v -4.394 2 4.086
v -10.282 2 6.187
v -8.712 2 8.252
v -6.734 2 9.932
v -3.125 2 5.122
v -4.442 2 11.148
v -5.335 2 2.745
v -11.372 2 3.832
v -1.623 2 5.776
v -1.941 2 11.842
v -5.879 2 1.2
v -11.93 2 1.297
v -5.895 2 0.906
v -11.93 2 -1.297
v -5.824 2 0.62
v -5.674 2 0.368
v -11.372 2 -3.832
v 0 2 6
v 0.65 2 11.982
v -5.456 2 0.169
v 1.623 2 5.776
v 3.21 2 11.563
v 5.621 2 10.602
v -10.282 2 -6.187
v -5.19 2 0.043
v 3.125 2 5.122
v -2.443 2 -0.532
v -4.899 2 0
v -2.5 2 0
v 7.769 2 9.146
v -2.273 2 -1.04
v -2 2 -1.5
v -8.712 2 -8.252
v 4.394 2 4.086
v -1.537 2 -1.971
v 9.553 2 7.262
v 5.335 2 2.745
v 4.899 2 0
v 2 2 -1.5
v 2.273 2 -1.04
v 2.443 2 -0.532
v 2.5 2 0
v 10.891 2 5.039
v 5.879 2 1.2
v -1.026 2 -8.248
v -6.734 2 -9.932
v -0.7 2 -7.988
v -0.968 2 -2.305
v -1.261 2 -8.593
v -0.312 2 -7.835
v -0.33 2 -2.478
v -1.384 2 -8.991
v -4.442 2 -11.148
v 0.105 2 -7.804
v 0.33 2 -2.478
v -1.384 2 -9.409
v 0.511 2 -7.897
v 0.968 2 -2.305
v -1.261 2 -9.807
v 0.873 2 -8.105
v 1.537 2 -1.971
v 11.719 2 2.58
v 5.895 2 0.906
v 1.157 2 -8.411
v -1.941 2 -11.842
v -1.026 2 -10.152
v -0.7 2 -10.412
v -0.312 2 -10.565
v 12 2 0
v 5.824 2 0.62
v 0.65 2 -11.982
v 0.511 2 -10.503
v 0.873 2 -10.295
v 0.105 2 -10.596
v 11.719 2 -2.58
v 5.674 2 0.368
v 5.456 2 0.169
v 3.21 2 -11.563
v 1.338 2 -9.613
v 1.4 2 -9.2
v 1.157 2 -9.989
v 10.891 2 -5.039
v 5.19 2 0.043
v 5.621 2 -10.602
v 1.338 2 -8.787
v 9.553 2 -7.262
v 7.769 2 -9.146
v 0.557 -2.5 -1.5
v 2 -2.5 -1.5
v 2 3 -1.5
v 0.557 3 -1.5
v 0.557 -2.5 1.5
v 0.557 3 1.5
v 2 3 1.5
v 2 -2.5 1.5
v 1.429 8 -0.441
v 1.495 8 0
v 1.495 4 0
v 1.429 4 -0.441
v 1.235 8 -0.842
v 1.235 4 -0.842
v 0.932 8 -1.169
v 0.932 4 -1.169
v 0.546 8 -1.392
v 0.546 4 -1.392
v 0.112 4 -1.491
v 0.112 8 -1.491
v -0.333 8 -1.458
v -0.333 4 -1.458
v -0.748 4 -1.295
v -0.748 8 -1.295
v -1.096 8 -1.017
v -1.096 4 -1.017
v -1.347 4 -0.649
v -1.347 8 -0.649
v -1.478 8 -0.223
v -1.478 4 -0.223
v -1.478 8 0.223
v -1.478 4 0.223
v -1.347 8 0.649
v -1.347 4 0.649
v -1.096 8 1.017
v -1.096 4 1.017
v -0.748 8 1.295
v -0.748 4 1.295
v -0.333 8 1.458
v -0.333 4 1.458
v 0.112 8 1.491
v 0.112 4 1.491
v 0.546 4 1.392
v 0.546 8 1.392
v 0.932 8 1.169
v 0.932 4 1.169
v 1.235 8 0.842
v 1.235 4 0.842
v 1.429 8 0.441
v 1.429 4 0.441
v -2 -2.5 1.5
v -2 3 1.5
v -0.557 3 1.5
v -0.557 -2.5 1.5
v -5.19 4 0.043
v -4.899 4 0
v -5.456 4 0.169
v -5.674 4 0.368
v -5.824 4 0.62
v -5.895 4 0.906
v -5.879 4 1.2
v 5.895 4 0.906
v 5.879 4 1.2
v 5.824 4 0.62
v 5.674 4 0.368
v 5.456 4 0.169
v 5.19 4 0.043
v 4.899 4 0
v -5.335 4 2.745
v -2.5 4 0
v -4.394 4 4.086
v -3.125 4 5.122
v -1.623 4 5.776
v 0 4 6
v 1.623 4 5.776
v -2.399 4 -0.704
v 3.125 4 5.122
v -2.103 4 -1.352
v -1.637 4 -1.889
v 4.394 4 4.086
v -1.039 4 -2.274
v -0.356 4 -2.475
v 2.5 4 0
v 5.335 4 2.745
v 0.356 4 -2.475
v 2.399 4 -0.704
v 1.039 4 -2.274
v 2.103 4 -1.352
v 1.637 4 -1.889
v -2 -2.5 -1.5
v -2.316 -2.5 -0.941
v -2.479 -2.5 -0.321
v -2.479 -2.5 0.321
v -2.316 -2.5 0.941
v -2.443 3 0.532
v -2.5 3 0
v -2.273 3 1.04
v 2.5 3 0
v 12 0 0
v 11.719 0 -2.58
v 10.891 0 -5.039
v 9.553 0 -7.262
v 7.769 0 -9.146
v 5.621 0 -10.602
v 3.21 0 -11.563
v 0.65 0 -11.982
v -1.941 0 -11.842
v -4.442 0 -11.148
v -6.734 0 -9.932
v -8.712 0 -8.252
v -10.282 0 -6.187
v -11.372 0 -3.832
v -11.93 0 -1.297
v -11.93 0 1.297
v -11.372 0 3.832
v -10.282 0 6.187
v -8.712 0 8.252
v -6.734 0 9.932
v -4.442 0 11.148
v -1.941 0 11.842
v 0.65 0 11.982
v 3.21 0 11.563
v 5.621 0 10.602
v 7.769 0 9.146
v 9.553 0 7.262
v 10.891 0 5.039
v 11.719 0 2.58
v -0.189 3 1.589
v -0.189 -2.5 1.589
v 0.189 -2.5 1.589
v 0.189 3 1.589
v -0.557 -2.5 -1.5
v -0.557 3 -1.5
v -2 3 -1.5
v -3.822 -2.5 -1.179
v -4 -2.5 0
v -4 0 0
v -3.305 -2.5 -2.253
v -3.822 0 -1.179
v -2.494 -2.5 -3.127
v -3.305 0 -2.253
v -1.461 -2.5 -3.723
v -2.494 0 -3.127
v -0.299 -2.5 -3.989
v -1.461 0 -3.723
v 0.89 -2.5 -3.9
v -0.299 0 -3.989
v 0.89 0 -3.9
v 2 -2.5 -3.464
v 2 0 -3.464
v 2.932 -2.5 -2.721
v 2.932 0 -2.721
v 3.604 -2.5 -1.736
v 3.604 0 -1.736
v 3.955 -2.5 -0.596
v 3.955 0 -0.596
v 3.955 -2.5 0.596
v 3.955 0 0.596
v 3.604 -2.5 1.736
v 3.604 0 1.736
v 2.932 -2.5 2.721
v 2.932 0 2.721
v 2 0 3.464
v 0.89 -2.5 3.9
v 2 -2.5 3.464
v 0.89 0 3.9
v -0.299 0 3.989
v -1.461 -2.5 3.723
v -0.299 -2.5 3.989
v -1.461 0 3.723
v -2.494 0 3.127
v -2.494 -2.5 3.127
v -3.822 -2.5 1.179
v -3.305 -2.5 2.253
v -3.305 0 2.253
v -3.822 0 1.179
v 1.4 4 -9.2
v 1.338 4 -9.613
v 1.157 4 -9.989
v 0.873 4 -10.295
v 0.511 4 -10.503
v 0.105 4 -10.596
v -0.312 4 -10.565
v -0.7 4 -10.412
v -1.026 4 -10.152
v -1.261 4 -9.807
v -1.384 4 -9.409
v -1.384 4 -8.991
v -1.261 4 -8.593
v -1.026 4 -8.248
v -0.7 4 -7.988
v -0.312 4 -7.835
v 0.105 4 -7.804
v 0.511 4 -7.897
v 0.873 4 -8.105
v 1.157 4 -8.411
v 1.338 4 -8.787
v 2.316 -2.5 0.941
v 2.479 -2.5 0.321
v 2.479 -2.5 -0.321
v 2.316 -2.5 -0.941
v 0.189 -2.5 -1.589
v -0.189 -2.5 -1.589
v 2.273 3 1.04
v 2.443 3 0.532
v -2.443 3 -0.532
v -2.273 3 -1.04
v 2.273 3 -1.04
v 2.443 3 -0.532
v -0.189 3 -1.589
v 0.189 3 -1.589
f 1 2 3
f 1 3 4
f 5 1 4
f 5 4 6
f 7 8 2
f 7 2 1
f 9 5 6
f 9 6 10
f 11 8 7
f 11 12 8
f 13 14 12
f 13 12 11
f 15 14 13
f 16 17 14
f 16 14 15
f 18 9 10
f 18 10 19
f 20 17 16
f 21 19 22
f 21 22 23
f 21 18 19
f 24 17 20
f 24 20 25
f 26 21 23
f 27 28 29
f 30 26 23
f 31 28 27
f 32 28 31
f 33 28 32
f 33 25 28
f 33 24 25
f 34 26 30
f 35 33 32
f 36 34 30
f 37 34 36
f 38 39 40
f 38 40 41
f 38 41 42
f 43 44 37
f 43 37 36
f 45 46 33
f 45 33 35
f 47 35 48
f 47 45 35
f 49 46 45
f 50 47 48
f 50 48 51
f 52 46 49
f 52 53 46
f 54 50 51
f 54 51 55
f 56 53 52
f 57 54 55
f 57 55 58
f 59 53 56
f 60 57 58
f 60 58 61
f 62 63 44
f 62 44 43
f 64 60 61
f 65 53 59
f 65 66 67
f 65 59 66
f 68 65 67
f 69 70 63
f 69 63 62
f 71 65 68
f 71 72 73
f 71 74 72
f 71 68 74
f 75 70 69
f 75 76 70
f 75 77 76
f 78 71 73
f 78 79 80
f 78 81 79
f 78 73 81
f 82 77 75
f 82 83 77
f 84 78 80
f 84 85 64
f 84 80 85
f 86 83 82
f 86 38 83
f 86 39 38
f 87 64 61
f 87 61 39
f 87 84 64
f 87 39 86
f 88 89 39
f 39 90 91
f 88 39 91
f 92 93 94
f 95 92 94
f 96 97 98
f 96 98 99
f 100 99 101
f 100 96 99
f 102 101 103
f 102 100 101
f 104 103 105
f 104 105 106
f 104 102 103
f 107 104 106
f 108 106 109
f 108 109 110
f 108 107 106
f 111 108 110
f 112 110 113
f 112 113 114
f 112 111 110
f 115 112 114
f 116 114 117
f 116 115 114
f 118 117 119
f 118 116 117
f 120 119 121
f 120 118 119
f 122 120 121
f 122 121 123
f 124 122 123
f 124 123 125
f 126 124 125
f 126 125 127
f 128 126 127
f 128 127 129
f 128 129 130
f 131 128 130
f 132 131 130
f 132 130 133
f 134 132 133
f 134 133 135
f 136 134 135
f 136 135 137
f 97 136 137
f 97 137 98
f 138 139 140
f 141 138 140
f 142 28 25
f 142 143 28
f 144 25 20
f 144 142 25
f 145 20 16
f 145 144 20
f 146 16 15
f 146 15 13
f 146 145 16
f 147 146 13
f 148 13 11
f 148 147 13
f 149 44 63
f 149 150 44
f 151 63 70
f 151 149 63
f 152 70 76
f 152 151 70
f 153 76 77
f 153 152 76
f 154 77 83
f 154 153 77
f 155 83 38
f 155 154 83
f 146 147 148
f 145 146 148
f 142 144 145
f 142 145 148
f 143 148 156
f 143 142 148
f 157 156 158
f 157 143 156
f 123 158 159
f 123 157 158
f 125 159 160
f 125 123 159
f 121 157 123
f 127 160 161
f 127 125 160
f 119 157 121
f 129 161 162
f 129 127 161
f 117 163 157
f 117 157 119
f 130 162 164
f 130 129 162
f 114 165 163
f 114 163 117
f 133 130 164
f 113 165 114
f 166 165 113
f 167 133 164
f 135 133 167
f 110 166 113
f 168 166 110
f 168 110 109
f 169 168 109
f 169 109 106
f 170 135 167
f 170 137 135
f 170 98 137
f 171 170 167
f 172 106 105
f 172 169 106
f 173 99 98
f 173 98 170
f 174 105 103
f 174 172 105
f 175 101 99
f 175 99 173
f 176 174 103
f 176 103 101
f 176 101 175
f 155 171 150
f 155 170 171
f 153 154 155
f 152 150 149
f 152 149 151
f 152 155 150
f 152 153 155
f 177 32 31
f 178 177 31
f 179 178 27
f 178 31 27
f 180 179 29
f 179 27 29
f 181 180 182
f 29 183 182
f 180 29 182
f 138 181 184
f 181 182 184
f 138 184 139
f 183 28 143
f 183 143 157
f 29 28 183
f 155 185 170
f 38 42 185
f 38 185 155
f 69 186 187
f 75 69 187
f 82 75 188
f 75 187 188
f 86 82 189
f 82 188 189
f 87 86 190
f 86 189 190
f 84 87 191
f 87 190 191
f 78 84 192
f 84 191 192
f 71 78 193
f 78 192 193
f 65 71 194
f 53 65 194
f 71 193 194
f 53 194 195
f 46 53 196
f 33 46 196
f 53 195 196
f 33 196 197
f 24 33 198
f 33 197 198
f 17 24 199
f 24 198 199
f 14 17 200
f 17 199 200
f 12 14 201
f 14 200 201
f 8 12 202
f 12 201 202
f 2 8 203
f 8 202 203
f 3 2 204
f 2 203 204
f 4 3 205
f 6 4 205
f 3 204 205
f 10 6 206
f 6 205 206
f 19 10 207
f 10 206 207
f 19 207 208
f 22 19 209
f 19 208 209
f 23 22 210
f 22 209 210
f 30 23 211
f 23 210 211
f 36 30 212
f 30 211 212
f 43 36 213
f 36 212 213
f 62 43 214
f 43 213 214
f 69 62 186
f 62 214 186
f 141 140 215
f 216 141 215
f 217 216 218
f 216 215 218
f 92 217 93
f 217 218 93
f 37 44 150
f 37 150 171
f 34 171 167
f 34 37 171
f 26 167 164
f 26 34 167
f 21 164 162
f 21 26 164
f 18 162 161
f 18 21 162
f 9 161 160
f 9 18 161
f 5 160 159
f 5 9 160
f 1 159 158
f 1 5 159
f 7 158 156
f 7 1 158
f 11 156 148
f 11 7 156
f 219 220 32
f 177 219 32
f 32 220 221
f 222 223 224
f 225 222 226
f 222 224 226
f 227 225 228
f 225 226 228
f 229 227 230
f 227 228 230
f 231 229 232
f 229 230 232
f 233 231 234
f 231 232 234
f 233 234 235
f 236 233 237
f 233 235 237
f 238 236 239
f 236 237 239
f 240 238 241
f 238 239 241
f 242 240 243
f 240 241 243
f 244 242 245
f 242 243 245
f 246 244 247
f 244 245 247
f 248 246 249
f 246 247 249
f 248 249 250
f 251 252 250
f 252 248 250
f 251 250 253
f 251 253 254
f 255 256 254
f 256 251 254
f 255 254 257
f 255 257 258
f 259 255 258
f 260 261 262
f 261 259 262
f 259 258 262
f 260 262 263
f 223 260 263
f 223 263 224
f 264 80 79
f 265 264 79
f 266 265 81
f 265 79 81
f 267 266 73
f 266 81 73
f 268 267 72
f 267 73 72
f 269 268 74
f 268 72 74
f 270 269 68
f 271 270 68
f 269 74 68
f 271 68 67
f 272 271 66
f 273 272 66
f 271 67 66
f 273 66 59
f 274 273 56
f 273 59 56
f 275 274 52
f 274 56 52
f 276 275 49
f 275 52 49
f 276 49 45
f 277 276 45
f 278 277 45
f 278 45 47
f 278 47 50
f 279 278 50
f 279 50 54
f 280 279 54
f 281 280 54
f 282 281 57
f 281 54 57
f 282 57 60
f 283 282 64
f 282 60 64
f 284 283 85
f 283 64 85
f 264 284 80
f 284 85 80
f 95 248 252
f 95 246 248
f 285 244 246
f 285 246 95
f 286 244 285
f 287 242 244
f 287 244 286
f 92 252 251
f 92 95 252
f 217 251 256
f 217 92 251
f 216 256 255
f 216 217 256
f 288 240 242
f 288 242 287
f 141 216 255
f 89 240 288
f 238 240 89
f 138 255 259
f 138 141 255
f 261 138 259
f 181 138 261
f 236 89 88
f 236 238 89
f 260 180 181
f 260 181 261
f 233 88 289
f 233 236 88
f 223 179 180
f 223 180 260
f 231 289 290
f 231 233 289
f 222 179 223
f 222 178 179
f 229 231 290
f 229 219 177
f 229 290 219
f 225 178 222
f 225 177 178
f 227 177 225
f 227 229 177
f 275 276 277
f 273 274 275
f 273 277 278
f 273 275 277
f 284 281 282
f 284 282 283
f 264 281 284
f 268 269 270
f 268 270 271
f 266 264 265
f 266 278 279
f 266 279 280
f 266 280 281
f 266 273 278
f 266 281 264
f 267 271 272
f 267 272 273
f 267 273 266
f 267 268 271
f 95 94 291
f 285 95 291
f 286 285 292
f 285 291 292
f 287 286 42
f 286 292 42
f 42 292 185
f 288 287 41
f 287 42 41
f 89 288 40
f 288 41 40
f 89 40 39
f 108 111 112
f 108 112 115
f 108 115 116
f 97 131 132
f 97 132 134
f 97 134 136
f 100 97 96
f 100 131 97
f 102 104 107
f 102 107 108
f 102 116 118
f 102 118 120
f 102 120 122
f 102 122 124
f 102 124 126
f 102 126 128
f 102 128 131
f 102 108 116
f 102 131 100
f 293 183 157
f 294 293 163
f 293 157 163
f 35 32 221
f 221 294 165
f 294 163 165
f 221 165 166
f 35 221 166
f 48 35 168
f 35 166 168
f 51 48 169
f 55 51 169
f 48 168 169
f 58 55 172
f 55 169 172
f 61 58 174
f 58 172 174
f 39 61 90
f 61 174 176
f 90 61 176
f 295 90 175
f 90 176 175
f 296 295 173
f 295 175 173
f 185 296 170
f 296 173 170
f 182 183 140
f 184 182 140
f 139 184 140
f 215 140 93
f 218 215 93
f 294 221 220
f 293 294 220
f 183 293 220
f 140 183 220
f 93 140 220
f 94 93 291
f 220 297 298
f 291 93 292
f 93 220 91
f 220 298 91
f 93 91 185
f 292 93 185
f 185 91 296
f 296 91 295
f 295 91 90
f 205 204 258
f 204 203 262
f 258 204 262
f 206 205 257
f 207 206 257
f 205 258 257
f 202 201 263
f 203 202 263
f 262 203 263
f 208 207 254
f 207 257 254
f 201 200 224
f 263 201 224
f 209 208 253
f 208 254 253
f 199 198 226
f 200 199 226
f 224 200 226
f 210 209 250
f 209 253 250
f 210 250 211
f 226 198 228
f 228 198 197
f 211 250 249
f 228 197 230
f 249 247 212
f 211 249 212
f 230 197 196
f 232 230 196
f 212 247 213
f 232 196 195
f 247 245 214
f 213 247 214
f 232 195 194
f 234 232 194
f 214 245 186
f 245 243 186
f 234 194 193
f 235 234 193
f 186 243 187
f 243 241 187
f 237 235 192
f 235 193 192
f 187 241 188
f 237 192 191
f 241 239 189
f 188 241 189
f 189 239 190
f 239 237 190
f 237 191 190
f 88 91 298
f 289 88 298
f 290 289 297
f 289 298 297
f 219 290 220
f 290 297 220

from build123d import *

# Parameters (mm, degrees)
SKETCH1_R                = 12
BOSS_EXTRUDE1_DEPTH      = 2
SKETCH2_R                = 1.5
BOSS_EXTRUDE2_DEPTH      = 2
SKETCH3_R                = 1.5
CUT_EXTRUDE1_DEPTH       = 5
SKETCH4_R                = 4
CUT_EXTRUDE2_DEPTH       = 2
SKETCH5_R                = 1.5
CUT_EXTRUDE3_DEPTH       = 2
SKETCH6_R                = 1.4
BOSS_EXTRUDE3_DEPTH      = 2
SKETCH7_R                = 1.6
CUT_EXTRUDE4_DEPTH       = 2
FILLET1_R                = 1
SKETCH8_R                = 4
BOSS_EXTRUDE7_DEPTH      = 5
SKETCH9_R                = 1.6
BOSS_EXTRUDE8_DEPTH      = 6
BOSS_EXTRUDE8_DEPTH_BACK = 2
SKETCH10_R               = 1.6
SKETCH10_R_2             = 1.495
CUT_EXTRUDE5_DEPTH       = 6
SKETCH11_R               = 4
BOSS_EXTRUDE9_DEPTH      = 2
CUT_EXTRUDE6_DEPTH       = 8
SKETCH13_R               = 6.833450219
CUT_EXTRUDE7_DEPTH       = 1
SKETCH14_R               = 7.033053892
CUT_EXTRUDE8_DEPTH       = 1
SKETCH15_R               = 8.776668046
CUT_EXTRUDE9_DEPTH       = 0.5
CUT_EXTRUDE10_DEPTH      = 2
CUT_EXTRUDE11_DEPTH      = 2


with BuildPart() as part:
    # Sketch1 → Boss-Extrude1 (new body)
    with BuildSketch(Plane(origin=(0, 0, 0), x_dir=(1, 0, 0), z_dir=(0, 1, 0))):
        Circle(SKETCH1_R)
    extrude(amount=BOSS_EXTRUDE1_DEPTH)

    # Sketch2 → Boss-Extrude2 (add)
    with BuildSketch(Plane(origin=(0, 2, 0), x_dir=(1, 0, 0), z_dir=(0, 1, 0))):
        with Locations((0, 9.5)):
            Circle(SKETCH2_R)
        with BuildLine():
            Line((-6, 0), (6, 0))
            ThreePointArc((6, 0), (0, -6), (-6, 0))
        make_face()
    extrude(amount=BOSS_EXTRUDE2_DEPTH)

    # Sketch3 → Cut-Extrude1 (cut)
    with BuildSketch(Plane.XZ):
        Circle(SKETCH3_R)
    extrude(amount=-CUT_EXTRUDE1_DEPTH, mode=Mode.SUBTRACT)

    # Sketch4 → Cut-Extrude2 (cut)
    with BuildSketch(Plane(origin=(0, 2, 0), x_dir=(1, 0, 0), z_dir=(0, 1, 0))):
        Circle(SKETCH4_R)
    extrude(amount=CUT_EXTRUDE2_DEPTH, mode=Mode.SUBTRACT)

    # Sketch5 → Cut-Extrude3 (cut)
    with BuildSketch(Plane(origin=(0, 2, 0), x_dir=(1, 0, 0), z_dir=(0, 1, 0))):
        with Locations((0, 9.5)):
            Circle(SKETCH5_R)
    extrude(amount=CUT_EXTRUDE3_DEPTH, mode=Mode.SUBTRACT)

    # Sketch6 → Boss-Extrude3 (add)
    with BuildSketch(Plane(origin=(0, 2, 0), x_dir=(1, 0, 0), z_dir=(0, 1, 0))):
        with Locations((0, 9.2)):
            Circle(SKETCH6_R)
    extrude(amount=BOSS_EXTRUDE3_DEPTH)

    # Sketch7 → Cut-Extrude4 (cut)
    with BuildSketch(Plane(origin=(0, 2, 0), x_dir=(1, 0, 0), z_dir=(0, 1, 0))):
        Circle(SKETCH7_R)
    extrude(amount=-CUT_EXTRUDE4_DEPTH, mode=Mode.SUBTRACT)

    # Fillet1
    fillet1_edges = [part.edges().sort_by_distance(p)[0] for p in [
        (-6, 3, 0),
        (6, 3, 0),
    ]]
    fillet(fillet1_edges, radius=FILLET1_R)

    # Sketch8 → Boss-Extrude7 (add)
    with BuildSketch(Plane(origin=(0, 0, 0), x_dir=(-1, 0, 0), z_dir=(0, -1, 0))):
        Circle(SKETCH8_R)
        with BuildLine():
            ThreePointArc((0.556776436, -1.5), (0, -1.6), (-0.556776436, -1.5))
            Line((-0.556776436, -1.5), (-2, -1.5))
            ThreePointArc((-2, -1.5), (-2.5, 0), (-2, 1.5))
            Line((-2, 1.5), (-0.556776436, 1.5))
            ThreePointArc((-0.556776436, 1.5), (0, 1.6), (0.556776436, 1.5))
            Line((0.556776436, 1.5), (2, 1.5))
            ThreePointArc((2, 1.5), (2.5, 0), (2, -1.5))
            Line((2, -1.5), (0.556776436, -1.5))
        make_face(mode=Mode.SUBTRACT)
    extrude(amount=BOSS_EXTRUDE7_DEPTH)

    # Sketch9 → Boss-Extrude8 (add, two sides)
    with BuildSketch(Plane(origin=(0, 2, 0), x_dir=(1, 0, 0), z_dir=(0, 1, 0))) as boss_extrude8_sk:
        Circle(SKETCH9_R)
    extrude(amount=BOSS_EXTRUDE8_DEPTH)
    extrude(boss_extrude8_sk.sketch, amount=-BOSS_EXTRUDE8_DEPTH_BACK)

    # Sketch10 → Cut-Extrude5 (cut)
    with BuildSketch(Plane(origin=(0, 8, 0), x_dir=(1, 0, 0), z_dir=(0, 1, 0))):
        Circle(SKETCH10_R)
        Circle(SKETCH10_R_2, mode=Mode.SUBTRACT)
    extrude(amount=-CUT_EXTRUDE5_DEPTH, mode=Mode.SUBTRACT)

    # Sketch11 → Boss-Extrude9 (add)
    with BuildSketch(Plane(origin=(0, 2, 0), x_dir=(1, 0, 0), z_dir=(0, 1, 0))):
        Circle(SKETCH11_R)
    extrude(amount=BOSS_EXTRUDE9_DEPTH)

    # Sketch12 → Cut-Extrude6 (cut)
    with BuildSketch(Plane(origin=(0, -5, 0), x_dir=(-1, 0, 0), z_dir=(0, -1, 0))):
        with BuildLine():
            Line((2, -1.5), (0.556776436, -1.5))
            ThreePointArc((0.556776436, -1.5), (0, -1.6), (-0.556776436, -1.5))
            Line((-0.556776436, -1.5), (-2, -1.5))
            ThreePointArc((-2, -1.5), (-2.5, 0), (-2, 1.5))
            Line((-2, 1.5), (-0.556776436, 1.5))
            ThreePointArc((-0.556776436, 1.5), (0, 1.6), (0.556776436, 1.5))
            Line((0.556776436, 1.5), (2, 1.5))
            ThreePointArc((2, 1.5), (2.5, 0), (2, -1.5))
        make_face()
    extrude(amount=-CUT_EXTRUDE6_DEPTH, mode=Mode.SUBTRACT)

    # Sketch13 → Cut-Extrude7 (cut)
    with BuildSketch(Plane(origin=(0, -5, 0), x_dir=(-1, 0, 0), z_dir=(0, -1, 0))):
        Circle(SKETCH13_R)
    extrude(amount=-CUT_EXTRUDE7_DEPTH, mode=Mode.SUBTRACT)

    # Sketch14 → Cut-Extrude8 (cut)
    with BuildSketch(Plane(origin=(0, -4, 0), x_dir=(-1, 0, 0), z_dir=(0, -1, 0))):
        Circle(SKETCH14_R)
    extrude(amount=-CUT_EXTRUDE8_DEPTH, mode=Mode.SUBTRACT)

    # Sketch15 → Cut-Extrude9 (cut)
    with BuildSketch(Plane(origin=(0, -3, 0), x_dir=(-1, 0, 0), z_dir=(0, -1, 0))):
        Circle(SKETCH15_R)
    extrude(amount=-CUT_EXTRUDE9_DEPTH, mode=Mode.SUBTRACT)

    # Sketch16 → Cut-Extrude10 (cut)
    with BuildSketch(Plane(origin=(0, 4, 0), x_dir=(1, 0, 0), z_dir=(0, 1, 0))):
        with BuildLine():
            Line((-4, 0), (-3, 0))
            ThreePointArc((-3, 0), (0, 3), (3, 0))
            Line((3, 0), (4, 0))
            Line((4, 0), (6.488398176, 5.447999119))
            Line((6.488398176, 5.447999119), (-6.411842689, 6.016687232))
            Line((-6.411842689, 6.016687232), (-4, 0))
        make_face()
    extrude(amount=-CUT_EXTRUDE10_DEPTH, mode=Mode.SUBTRACT)

    # Sketch17 → Cut-Extrude11 (cut)
    with BuildSketch(Plane(origin=(0, 4, 0), x_dir=(1, 0, 0), z_dir=(0, 1, 0))):
        with BuildLine():
            Line((-3, 0), (-2.5, 0))
            ThreePointArc((-2.5, 0), (0, 2.5), (2.5, 0))
            Line((2.5, 0), (3, 0))
            Line((3, 0), (3.695122569, 4.261417823))
            Line((3.695122569, 4.261417823), (-7.0808681, 5.499359859))
            Line((-7.0808681, 5.499359859), (-3, 0))
        make_face()
    extrude(amount=-CUT_EXTRUDE11_DEPTH, mode=Mode.SUBTRACT)


solid = part.part
